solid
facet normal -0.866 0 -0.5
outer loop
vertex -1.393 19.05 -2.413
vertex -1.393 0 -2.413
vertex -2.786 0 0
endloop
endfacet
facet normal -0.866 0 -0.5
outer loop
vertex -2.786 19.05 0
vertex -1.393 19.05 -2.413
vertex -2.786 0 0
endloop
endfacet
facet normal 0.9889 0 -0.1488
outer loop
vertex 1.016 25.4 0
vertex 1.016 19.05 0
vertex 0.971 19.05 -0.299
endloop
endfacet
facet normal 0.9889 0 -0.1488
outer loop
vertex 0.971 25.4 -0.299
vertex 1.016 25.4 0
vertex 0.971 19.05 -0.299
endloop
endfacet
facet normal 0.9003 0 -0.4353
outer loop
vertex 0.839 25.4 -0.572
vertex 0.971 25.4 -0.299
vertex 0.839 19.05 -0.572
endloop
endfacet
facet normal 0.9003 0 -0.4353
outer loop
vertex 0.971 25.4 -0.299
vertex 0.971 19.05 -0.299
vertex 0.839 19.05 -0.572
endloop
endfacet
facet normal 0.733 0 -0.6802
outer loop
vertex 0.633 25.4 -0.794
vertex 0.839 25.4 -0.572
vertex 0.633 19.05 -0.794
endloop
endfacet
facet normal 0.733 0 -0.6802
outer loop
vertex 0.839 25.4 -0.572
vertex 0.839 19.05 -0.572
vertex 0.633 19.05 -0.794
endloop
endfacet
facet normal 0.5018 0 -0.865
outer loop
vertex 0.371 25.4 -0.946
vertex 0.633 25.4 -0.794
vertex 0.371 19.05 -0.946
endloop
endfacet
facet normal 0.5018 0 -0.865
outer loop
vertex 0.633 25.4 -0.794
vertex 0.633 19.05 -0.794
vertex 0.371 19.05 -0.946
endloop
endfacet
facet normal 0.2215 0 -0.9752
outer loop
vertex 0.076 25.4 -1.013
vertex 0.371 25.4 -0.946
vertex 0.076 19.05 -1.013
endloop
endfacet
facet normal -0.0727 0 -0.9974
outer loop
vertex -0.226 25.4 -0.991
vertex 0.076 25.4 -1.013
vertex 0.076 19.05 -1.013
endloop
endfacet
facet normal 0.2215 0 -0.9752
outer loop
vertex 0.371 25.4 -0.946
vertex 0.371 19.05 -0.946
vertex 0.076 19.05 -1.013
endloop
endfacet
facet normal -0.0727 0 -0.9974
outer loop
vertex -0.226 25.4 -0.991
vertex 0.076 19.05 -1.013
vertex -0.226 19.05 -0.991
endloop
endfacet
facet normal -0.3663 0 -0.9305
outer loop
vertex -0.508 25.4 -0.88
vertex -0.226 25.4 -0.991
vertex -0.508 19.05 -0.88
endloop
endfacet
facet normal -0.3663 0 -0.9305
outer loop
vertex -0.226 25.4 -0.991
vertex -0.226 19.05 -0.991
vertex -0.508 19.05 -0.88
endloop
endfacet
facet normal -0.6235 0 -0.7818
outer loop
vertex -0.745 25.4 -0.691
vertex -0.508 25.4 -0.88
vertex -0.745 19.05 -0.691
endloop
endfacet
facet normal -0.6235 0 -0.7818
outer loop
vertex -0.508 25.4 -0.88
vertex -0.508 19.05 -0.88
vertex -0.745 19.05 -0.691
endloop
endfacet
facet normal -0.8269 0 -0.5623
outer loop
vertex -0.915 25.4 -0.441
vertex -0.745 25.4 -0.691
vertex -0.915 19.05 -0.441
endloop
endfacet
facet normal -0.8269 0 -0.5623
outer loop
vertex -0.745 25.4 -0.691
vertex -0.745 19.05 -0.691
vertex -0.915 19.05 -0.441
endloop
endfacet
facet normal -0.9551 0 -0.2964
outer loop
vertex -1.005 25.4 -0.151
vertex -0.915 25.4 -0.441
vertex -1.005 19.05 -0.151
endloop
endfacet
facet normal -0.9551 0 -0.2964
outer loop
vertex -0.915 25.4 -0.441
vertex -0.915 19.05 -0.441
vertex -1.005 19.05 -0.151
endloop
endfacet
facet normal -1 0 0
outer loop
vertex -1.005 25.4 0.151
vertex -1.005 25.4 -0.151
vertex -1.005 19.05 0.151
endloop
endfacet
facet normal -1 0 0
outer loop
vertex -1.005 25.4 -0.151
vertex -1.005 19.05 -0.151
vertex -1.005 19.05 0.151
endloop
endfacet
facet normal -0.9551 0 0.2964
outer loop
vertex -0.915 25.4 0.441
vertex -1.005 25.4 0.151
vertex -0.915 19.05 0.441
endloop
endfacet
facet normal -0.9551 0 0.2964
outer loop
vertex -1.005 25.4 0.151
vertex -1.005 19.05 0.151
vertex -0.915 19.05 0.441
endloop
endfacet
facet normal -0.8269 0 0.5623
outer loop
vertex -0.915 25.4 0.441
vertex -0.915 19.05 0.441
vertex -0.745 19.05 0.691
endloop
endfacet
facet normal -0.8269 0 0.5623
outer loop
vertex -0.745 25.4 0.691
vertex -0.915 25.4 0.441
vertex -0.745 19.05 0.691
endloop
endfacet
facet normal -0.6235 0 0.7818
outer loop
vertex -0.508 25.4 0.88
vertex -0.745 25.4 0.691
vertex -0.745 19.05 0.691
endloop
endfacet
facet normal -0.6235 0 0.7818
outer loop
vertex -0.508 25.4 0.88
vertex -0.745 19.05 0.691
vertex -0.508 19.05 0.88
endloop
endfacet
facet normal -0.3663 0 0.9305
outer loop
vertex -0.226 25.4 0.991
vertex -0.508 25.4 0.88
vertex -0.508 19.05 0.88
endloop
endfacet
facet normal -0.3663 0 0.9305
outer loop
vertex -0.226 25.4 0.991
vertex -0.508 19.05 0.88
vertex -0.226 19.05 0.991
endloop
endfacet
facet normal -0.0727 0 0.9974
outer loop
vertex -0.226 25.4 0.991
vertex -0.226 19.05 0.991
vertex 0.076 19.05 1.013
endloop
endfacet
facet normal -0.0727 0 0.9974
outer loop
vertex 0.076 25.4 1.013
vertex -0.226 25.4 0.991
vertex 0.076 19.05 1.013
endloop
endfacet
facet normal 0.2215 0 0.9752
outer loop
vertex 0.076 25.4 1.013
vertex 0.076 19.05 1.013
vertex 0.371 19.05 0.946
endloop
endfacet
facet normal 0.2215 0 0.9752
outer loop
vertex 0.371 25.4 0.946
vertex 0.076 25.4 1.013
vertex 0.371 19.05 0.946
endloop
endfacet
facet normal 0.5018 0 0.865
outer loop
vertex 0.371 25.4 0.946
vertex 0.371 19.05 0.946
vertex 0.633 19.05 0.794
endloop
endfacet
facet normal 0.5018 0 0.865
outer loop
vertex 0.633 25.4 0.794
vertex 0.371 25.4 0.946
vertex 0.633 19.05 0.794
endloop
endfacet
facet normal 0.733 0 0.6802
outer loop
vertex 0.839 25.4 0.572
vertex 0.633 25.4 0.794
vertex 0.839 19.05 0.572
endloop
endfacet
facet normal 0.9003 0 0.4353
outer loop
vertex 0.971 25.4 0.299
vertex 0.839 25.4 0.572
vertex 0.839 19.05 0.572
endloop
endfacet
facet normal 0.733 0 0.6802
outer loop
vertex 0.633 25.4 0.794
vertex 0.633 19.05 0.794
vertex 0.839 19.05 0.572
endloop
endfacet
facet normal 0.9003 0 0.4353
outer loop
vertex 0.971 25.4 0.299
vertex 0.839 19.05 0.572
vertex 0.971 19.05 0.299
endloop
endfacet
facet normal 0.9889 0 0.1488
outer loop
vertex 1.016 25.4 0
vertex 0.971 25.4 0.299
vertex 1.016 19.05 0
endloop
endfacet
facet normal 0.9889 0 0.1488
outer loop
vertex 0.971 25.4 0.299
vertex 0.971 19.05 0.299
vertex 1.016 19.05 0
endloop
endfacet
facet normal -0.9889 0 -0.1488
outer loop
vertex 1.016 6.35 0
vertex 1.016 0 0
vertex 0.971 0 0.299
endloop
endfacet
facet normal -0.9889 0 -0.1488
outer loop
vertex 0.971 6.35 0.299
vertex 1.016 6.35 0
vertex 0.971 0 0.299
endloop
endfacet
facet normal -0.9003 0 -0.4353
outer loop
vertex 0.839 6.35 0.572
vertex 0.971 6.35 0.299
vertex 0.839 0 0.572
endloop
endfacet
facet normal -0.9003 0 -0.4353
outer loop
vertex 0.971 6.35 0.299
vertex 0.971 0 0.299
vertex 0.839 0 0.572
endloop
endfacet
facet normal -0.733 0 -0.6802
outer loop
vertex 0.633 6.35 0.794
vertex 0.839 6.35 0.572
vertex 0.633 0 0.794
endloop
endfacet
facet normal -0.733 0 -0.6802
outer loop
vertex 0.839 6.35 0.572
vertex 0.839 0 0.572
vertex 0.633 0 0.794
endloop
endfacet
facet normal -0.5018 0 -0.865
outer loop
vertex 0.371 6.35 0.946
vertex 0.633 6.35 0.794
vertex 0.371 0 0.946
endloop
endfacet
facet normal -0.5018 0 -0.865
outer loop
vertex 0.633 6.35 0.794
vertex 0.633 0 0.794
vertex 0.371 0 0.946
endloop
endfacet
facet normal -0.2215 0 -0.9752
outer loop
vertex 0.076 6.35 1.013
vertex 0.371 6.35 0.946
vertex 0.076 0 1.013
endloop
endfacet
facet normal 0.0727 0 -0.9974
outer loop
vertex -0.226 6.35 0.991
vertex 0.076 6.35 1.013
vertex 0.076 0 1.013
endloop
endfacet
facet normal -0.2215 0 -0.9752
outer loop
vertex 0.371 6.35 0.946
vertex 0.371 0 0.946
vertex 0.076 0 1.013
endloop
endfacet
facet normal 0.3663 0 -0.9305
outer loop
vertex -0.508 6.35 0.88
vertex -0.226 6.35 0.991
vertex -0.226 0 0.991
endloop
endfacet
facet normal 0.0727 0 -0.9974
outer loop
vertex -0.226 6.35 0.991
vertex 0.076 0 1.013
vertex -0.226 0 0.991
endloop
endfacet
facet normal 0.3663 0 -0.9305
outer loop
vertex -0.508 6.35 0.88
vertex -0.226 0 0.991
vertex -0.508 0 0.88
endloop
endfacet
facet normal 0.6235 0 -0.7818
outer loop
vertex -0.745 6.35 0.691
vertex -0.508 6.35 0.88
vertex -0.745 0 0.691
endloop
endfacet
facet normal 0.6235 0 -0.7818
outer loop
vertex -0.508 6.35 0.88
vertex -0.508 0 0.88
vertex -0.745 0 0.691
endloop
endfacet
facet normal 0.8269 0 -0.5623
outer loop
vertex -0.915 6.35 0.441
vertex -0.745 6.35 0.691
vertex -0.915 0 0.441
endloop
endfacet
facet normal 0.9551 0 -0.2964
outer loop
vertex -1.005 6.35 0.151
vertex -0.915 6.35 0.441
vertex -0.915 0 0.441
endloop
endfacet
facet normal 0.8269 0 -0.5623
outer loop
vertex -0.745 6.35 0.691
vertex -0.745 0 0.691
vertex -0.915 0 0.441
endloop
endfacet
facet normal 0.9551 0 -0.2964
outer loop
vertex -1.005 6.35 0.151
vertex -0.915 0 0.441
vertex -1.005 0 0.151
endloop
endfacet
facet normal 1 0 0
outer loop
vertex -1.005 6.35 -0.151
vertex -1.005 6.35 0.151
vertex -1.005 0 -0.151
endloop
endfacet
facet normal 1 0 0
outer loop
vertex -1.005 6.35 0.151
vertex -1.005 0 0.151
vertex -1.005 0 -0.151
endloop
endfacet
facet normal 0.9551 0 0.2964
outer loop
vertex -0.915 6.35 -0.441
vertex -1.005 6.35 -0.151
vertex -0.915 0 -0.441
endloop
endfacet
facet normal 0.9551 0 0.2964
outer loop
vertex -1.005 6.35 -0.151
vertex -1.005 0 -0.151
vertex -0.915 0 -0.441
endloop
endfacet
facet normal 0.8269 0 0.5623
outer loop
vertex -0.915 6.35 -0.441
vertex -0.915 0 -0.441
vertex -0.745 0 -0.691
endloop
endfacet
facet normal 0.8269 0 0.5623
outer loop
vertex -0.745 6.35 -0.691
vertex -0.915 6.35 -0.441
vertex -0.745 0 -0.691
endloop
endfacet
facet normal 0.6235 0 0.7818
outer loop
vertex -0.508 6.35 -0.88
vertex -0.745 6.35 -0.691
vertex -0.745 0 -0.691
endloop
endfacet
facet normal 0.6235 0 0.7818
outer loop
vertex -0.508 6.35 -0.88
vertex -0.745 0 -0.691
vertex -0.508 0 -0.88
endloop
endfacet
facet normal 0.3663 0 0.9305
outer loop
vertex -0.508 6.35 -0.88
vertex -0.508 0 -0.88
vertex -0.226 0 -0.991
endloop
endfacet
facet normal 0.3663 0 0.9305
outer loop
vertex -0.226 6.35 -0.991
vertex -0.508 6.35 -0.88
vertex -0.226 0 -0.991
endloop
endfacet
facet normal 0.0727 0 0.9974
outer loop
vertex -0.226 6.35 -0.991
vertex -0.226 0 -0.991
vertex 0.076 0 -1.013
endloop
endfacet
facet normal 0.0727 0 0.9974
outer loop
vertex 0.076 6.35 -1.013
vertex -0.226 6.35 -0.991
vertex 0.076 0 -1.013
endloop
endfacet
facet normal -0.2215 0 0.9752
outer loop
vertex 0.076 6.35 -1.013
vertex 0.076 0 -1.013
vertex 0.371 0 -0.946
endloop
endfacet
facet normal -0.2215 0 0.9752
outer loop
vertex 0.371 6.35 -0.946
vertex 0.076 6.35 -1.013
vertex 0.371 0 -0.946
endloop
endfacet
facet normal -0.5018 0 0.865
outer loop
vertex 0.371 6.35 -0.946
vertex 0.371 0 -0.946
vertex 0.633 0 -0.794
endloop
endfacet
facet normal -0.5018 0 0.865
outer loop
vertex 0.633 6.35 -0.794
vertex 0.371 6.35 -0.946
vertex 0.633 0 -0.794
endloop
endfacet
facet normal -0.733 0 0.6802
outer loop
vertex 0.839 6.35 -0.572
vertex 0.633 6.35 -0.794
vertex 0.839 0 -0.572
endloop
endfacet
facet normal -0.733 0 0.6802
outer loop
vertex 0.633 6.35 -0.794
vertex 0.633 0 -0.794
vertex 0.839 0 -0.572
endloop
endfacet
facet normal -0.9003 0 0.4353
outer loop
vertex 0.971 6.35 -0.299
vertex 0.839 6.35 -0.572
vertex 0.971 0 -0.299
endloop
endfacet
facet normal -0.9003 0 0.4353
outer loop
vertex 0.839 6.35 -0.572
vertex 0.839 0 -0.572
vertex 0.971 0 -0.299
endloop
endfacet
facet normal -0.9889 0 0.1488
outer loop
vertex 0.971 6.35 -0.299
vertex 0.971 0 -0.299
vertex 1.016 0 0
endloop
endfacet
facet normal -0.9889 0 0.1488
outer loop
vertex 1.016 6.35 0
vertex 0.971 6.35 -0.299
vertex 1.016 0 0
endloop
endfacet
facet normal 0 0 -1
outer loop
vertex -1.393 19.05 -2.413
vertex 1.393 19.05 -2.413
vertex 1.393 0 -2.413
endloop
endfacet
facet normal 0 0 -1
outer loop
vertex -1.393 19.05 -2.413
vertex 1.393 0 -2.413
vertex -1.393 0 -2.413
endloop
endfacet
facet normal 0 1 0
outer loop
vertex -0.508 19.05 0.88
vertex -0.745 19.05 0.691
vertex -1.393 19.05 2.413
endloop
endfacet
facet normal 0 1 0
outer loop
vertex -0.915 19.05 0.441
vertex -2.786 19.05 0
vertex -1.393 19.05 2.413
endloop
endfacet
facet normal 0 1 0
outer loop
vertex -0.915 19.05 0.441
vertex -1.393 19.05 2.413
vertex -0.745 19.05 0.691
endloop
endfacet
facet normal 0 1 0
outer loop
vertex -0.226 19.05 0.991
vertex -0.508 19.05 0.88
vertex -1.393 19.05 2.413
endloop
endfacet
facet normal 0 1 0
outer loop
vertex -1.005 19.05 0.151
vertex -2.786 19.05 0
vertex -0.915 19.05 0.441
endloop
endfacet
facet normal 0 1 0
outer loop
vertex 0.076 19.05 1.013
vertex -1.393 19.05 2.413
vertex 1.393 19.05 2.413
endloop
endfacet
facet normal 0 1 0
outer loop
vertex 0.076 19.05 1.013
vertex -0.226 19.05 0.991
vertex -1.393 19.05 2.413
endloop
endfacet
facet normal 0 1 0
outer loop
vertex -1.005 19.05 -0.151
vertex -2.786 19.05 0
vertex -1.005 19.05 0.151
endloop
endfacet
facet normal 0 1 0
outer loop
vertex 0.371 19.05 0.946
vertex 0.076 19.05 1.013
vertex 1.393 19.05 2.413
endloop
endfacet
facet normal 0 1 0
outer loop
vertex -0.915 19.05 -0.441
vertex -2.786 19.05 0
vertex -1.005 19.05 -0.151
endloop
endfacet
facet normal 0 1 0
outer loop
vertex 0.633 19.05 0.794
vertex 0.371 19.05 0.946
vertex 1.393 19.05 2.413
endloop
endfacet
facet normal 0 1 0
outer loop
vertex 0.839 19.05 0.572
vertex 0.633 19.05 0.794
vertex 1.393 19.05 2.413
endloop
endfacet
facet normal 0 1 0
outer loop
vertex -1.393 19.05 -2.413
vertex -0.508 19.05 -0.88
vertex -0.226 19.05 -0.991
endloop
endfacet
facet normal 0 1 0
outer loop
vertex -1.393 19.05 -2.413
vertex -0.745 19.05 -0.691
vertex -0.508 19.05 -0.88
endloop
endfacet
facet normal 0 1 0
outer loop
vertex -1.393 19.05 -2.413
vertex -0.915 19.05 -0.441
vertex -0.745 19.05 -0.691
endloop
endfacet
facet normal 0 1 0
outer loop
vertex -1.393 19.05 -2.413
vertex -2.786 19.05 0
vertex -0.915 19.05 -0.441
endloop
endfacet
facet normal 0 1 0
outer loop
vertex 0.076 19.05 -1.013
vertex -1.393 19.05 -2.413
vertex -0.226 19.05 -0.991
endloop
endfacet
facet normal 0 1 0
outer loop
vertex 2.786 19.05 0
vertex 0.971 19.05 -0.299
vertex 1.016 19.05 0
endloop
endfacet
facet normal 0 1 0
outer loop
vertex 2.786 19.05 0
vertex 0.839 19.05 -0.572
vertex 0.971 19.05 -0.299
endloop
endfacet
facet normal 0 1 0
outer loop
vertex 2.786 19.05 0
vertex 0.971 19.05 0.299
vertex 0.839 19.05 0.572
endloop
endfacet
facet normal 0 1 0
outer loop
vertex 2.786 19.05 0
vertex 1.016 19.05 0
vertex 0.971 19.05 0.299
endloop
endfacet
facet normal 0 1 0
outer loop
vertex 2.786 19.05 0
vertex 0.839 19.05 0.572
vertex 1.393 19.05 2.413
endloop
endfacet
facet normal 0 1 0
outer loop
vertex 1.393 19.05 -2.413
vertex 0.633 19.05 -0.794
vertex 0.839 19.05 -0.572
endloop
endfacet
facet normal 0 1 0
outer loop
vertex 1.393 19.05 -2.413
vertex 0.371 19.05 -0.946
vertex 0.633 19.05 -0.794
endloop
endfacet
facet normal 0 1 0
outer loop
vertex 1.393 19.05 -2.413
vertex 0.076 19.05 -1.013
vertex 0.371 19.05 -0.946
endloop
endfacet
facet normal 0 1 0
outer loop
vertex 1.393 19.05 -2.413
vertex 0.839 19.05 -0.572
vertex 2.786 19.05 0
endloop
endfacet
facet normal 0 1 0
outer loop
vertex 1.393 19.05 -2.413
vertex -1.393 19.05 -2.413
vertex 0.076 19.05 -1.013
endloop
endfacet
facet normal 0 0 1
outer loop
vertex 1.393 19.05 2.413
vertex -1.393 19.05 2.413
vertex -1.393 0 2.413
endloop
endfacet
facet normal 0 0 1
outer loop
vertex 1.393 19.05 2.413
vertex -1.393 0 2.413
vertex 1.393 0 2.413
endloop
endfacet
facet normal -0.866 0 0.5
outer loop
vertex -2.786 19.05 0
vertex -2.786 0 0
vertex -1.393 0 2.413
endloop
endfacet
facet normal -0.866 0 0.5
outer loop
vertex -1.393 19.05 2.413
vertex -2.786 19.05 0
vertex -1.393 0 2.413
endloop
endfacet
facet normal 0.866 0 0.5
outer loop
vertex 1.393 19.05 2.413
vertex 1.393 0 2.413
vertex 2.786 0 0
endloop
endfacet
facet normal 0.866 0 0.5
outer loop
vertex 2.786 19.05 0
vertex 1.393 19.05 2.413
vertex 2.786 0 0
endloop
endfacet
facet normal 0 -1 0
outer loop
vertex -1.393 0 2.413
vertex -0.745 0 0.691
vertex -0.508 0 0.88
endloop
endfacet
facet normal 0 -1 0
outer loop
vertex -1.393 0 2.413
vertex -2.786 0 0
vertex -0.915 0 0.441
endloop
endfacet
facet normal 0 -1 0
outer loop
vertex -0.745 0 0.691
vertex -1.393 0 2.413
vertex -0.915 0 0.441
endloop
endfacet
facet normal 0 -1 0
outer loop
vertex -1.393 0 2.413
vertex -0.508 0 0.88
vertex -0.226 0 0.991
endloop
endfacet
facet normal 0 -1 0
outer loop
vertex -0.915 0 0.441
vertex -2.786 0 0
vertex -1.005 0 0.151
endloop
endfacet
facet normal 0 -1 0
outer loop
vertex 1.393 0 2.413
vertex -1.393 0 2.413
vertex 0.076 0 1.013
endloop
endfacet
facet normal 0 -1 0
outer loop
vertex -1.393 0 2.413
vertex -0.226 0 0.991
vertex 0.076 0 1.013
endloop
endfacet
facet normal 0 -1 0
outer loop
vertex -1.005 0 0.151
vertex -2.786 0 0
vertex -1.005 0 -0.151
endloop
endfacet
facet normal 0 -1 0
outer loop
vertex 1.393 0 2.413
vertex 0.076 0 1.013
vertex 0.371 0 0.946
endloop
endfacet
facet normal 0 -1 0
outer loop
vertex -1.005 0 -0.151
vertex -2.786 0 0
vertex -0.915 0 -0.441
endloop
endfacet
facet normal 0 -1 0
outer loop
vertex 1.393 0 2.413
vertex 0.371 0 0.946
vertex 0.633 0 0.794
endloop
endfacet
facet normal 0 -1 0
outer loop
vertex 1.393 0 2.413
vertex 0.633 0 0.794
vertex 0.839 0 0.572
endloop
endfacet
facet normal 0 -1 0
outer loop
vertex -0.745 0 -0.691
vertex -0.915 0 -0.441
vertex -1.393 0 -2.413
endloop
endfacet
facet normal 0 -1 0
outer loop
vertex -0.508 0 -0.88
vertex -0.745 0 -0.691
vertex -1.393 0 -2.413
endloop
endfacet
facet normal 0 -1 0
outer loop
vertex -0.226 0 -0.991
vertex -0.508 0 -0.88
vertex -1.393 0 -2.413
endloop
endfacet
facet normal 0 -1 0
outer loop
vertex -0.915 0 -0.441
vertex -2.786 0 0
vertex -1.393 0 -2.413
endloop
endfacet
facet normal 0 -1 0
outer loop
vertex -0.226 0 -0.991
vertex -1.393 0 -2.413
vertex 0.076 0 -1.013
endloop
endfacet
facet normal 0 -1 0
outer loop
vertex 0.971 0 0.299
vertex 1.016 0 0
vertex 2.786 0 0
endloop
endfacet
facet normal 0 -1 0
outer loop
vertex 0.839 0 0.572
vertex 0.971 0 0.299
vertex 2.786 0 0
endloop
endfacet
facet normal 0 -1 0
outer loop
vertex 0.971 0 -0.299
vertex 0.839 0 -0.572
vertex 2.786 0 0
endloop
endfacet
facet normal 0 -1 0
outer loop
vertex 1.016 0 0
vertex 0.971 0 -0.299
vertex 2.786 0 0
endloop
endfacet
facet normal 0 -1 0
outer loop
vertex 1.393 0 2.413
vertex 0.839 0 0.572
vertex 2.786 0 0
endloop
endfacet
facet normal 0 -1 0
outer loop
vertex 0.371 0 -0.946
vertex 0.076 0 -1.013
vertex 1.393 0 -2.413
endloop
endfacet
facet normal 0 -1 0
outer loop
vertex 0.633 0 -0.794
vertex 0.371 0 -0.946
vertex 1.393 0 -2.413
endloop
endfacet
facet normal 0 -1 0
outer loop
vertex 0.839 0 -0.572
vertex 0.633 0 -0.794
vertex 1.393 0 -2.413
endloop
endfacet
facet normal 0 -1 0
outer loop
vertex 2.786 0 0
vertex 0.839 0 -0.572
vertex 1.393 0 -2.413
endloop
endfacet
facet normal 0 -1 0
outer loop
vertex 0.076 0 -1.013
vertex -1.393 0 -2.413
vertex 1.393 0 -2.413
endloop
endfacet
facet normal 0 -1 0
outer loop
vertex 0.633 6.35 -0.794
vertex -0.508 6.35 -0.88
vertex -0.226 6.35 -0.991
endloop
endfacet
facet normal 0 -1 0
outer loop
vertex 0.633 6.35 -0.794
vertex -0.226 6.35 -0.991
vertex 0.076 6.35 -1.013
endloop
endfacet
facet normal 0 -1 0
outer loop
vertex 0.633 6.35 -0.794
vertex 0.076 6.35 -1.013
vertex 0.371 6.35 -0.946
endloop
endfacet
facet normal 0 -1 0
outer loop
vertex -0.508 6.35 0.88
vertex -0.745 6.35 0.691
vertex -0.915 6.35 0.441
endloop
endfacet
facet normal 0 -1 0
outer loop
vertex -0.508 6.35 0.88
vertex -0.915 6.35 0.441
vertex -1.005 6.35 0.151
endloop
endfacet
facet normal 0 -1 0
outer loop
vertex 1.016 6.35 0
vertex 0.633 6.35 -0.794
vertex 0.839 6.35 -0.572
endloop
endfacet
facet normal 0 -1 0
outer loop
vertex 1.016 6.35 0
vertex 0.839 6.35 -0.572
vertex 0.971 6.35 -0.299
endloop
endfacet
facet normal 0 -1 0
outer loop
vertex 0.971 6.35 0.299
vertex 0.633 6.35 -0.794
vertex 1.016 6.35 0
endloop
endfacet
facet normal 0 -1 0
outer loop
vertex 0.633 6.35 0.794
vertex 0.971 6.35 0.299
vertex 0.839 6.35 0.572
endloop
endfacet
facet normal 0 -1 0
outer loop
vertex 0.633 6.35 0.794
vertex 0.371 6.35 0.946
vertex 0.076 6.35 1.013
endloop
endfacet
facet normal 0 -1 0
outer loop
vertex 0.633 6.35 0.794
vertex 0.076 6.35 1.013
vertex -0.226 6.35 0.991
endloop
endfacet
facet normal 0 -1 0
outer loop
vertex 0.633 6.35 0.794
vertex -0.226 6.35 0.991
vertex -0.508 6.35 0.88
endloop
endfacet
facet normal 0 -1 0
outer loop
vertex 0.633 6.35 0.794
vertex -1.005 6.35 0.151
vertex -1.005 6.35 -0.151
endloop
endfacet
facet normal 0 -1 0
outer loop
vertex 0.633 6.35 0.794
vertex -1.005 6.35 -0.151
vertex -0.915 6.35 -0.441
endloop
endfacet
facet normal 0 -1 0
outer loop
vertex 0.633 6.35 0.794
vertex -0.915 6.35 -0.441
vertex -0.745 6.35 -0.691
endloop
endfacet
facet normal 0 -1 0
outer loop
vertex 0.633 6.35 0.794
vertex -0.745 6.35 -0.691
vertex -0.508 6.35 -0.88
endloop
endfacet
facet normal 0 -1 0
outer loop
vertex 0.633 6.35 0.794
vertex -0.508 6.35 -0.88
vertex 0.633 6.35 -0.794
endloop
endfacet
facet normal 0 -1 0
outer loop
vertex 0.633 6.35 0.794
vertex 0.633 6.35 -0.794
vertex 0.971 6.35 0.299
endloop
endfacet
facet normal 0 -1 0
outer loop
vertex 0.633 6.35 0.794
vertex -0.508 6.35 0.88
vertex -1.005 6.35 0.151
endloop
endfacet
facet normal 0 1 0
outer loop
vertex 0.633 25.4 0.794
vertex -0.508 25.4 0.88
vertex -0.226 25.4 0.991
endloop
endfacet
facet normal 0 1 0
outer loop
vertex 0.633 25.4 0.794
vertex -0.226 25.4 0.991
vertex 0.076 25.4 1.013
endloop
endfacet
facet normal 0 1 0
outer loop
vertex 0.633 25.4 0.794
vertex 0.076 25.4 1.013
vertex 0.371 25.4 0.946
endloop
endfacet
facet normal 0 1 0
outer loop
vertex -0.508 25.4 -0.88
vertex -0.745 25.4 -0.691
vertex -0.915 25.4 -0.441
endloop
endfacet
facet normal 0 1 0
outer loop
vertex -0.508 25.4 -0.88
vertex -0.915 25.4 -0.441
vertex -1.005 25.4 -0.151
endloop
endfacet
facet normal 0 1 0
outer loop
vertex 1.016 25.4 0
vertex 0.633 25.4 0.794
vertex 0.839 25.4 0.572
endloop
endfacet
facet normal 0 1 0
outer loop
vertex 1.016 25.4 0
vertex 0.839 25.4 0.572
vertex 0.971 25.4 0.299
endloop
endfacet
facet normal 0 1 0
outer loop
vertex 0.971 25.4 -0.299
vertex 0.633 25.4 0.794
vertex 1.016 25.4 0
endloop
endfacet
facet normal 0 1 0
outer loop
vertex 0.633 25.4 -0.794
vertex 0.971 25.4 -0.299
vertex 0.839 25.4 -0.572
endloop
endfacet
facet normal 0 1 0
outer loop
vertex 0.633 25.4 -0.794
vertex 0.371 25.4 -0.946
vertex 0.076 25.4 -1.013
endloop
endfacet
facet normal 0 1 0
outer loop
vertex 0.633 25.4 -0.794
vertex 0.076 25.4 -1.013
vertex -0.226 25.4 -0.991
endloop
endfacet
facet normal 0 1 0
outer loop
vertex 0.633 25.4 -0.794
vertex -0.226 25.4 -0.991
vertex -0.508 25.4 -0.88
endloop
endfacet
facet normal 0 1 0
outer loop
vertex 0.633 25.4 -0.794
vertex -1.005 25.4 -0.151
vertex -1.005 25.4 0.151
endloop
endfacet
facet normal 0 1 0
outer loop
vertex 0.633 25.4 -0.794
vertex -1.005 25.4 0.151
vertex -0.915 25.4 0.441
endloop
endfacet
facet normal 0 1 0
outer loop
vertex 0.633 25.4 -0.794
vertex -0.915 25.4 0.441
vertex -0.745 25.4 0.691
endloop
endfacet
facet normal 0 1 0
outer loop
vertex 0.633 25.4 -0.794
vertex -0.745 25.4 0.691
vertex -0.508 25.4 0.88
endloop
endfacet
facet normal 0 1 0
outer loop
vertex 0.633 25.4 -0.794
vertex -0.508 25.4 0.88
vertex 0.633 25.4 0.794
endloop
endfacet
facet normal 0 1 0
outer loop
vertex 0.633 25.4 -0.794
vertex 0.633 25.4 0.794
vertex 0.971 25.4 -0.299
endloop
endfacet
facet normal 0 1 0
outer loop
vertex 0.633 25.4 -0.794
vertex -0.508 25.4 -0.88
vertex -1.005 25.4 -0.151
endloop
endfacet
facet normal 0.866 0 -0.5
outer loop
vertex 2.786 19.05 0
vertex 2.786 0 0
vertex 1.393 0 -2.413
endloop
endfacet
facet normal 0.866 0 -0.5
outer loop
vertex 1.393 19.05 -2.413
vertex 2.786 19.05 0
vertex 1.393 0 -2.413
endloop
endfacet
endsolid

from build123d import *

# Parameters (mm, degrees)
BOSS_EXTRUDE1_DEPTH = 19.05
SKETCH2_R           = 1.016
BOSS_EXTRUDE2_DEPTH = 6.35
SKETCH3_R           = 1.016
CUT_EXTRUDE1_DEPTH  = 6.35


with BuildPart() as part:
    # Sketch1 → Boss-Extrude1 (new body)
    with BuildSketch(Plane(origin=(0, 0, 0), x_dir=(1, 0, 0), z_dir=(0, 1, 0))):
        Polygon((1.3931462, -2.413), (2.786292399, 0), (1.3931462, 2.413), (-1.3931462, 2.413), (-2.786292399, 0), (-1.3931462, -2.413), align=None)
    extrude(amount=BOSS_EXTRUDE1_DEPTH)

    # Sketch2 → Boss-Extrude2 (add)
    with BuildSketch(Plane(origin=(0, 19.05, 0), x_dir=(1, 0, 0), z_dir=(0, 1, 0))):
        Circle(SKETCH2_R)
    extrude(amount=BOSS_EXTRUDE2_DEPTH)

    # Sketch3 → Cut-Extrude1 (cut)
    with BuildSketch(Plane.XZ):
        Circle(SKETCH3_R)
    extrude(amount=-CUT_EXTRUDE1_DEPTH, mode=Mode.SUBTRACT)


solid = part.part
